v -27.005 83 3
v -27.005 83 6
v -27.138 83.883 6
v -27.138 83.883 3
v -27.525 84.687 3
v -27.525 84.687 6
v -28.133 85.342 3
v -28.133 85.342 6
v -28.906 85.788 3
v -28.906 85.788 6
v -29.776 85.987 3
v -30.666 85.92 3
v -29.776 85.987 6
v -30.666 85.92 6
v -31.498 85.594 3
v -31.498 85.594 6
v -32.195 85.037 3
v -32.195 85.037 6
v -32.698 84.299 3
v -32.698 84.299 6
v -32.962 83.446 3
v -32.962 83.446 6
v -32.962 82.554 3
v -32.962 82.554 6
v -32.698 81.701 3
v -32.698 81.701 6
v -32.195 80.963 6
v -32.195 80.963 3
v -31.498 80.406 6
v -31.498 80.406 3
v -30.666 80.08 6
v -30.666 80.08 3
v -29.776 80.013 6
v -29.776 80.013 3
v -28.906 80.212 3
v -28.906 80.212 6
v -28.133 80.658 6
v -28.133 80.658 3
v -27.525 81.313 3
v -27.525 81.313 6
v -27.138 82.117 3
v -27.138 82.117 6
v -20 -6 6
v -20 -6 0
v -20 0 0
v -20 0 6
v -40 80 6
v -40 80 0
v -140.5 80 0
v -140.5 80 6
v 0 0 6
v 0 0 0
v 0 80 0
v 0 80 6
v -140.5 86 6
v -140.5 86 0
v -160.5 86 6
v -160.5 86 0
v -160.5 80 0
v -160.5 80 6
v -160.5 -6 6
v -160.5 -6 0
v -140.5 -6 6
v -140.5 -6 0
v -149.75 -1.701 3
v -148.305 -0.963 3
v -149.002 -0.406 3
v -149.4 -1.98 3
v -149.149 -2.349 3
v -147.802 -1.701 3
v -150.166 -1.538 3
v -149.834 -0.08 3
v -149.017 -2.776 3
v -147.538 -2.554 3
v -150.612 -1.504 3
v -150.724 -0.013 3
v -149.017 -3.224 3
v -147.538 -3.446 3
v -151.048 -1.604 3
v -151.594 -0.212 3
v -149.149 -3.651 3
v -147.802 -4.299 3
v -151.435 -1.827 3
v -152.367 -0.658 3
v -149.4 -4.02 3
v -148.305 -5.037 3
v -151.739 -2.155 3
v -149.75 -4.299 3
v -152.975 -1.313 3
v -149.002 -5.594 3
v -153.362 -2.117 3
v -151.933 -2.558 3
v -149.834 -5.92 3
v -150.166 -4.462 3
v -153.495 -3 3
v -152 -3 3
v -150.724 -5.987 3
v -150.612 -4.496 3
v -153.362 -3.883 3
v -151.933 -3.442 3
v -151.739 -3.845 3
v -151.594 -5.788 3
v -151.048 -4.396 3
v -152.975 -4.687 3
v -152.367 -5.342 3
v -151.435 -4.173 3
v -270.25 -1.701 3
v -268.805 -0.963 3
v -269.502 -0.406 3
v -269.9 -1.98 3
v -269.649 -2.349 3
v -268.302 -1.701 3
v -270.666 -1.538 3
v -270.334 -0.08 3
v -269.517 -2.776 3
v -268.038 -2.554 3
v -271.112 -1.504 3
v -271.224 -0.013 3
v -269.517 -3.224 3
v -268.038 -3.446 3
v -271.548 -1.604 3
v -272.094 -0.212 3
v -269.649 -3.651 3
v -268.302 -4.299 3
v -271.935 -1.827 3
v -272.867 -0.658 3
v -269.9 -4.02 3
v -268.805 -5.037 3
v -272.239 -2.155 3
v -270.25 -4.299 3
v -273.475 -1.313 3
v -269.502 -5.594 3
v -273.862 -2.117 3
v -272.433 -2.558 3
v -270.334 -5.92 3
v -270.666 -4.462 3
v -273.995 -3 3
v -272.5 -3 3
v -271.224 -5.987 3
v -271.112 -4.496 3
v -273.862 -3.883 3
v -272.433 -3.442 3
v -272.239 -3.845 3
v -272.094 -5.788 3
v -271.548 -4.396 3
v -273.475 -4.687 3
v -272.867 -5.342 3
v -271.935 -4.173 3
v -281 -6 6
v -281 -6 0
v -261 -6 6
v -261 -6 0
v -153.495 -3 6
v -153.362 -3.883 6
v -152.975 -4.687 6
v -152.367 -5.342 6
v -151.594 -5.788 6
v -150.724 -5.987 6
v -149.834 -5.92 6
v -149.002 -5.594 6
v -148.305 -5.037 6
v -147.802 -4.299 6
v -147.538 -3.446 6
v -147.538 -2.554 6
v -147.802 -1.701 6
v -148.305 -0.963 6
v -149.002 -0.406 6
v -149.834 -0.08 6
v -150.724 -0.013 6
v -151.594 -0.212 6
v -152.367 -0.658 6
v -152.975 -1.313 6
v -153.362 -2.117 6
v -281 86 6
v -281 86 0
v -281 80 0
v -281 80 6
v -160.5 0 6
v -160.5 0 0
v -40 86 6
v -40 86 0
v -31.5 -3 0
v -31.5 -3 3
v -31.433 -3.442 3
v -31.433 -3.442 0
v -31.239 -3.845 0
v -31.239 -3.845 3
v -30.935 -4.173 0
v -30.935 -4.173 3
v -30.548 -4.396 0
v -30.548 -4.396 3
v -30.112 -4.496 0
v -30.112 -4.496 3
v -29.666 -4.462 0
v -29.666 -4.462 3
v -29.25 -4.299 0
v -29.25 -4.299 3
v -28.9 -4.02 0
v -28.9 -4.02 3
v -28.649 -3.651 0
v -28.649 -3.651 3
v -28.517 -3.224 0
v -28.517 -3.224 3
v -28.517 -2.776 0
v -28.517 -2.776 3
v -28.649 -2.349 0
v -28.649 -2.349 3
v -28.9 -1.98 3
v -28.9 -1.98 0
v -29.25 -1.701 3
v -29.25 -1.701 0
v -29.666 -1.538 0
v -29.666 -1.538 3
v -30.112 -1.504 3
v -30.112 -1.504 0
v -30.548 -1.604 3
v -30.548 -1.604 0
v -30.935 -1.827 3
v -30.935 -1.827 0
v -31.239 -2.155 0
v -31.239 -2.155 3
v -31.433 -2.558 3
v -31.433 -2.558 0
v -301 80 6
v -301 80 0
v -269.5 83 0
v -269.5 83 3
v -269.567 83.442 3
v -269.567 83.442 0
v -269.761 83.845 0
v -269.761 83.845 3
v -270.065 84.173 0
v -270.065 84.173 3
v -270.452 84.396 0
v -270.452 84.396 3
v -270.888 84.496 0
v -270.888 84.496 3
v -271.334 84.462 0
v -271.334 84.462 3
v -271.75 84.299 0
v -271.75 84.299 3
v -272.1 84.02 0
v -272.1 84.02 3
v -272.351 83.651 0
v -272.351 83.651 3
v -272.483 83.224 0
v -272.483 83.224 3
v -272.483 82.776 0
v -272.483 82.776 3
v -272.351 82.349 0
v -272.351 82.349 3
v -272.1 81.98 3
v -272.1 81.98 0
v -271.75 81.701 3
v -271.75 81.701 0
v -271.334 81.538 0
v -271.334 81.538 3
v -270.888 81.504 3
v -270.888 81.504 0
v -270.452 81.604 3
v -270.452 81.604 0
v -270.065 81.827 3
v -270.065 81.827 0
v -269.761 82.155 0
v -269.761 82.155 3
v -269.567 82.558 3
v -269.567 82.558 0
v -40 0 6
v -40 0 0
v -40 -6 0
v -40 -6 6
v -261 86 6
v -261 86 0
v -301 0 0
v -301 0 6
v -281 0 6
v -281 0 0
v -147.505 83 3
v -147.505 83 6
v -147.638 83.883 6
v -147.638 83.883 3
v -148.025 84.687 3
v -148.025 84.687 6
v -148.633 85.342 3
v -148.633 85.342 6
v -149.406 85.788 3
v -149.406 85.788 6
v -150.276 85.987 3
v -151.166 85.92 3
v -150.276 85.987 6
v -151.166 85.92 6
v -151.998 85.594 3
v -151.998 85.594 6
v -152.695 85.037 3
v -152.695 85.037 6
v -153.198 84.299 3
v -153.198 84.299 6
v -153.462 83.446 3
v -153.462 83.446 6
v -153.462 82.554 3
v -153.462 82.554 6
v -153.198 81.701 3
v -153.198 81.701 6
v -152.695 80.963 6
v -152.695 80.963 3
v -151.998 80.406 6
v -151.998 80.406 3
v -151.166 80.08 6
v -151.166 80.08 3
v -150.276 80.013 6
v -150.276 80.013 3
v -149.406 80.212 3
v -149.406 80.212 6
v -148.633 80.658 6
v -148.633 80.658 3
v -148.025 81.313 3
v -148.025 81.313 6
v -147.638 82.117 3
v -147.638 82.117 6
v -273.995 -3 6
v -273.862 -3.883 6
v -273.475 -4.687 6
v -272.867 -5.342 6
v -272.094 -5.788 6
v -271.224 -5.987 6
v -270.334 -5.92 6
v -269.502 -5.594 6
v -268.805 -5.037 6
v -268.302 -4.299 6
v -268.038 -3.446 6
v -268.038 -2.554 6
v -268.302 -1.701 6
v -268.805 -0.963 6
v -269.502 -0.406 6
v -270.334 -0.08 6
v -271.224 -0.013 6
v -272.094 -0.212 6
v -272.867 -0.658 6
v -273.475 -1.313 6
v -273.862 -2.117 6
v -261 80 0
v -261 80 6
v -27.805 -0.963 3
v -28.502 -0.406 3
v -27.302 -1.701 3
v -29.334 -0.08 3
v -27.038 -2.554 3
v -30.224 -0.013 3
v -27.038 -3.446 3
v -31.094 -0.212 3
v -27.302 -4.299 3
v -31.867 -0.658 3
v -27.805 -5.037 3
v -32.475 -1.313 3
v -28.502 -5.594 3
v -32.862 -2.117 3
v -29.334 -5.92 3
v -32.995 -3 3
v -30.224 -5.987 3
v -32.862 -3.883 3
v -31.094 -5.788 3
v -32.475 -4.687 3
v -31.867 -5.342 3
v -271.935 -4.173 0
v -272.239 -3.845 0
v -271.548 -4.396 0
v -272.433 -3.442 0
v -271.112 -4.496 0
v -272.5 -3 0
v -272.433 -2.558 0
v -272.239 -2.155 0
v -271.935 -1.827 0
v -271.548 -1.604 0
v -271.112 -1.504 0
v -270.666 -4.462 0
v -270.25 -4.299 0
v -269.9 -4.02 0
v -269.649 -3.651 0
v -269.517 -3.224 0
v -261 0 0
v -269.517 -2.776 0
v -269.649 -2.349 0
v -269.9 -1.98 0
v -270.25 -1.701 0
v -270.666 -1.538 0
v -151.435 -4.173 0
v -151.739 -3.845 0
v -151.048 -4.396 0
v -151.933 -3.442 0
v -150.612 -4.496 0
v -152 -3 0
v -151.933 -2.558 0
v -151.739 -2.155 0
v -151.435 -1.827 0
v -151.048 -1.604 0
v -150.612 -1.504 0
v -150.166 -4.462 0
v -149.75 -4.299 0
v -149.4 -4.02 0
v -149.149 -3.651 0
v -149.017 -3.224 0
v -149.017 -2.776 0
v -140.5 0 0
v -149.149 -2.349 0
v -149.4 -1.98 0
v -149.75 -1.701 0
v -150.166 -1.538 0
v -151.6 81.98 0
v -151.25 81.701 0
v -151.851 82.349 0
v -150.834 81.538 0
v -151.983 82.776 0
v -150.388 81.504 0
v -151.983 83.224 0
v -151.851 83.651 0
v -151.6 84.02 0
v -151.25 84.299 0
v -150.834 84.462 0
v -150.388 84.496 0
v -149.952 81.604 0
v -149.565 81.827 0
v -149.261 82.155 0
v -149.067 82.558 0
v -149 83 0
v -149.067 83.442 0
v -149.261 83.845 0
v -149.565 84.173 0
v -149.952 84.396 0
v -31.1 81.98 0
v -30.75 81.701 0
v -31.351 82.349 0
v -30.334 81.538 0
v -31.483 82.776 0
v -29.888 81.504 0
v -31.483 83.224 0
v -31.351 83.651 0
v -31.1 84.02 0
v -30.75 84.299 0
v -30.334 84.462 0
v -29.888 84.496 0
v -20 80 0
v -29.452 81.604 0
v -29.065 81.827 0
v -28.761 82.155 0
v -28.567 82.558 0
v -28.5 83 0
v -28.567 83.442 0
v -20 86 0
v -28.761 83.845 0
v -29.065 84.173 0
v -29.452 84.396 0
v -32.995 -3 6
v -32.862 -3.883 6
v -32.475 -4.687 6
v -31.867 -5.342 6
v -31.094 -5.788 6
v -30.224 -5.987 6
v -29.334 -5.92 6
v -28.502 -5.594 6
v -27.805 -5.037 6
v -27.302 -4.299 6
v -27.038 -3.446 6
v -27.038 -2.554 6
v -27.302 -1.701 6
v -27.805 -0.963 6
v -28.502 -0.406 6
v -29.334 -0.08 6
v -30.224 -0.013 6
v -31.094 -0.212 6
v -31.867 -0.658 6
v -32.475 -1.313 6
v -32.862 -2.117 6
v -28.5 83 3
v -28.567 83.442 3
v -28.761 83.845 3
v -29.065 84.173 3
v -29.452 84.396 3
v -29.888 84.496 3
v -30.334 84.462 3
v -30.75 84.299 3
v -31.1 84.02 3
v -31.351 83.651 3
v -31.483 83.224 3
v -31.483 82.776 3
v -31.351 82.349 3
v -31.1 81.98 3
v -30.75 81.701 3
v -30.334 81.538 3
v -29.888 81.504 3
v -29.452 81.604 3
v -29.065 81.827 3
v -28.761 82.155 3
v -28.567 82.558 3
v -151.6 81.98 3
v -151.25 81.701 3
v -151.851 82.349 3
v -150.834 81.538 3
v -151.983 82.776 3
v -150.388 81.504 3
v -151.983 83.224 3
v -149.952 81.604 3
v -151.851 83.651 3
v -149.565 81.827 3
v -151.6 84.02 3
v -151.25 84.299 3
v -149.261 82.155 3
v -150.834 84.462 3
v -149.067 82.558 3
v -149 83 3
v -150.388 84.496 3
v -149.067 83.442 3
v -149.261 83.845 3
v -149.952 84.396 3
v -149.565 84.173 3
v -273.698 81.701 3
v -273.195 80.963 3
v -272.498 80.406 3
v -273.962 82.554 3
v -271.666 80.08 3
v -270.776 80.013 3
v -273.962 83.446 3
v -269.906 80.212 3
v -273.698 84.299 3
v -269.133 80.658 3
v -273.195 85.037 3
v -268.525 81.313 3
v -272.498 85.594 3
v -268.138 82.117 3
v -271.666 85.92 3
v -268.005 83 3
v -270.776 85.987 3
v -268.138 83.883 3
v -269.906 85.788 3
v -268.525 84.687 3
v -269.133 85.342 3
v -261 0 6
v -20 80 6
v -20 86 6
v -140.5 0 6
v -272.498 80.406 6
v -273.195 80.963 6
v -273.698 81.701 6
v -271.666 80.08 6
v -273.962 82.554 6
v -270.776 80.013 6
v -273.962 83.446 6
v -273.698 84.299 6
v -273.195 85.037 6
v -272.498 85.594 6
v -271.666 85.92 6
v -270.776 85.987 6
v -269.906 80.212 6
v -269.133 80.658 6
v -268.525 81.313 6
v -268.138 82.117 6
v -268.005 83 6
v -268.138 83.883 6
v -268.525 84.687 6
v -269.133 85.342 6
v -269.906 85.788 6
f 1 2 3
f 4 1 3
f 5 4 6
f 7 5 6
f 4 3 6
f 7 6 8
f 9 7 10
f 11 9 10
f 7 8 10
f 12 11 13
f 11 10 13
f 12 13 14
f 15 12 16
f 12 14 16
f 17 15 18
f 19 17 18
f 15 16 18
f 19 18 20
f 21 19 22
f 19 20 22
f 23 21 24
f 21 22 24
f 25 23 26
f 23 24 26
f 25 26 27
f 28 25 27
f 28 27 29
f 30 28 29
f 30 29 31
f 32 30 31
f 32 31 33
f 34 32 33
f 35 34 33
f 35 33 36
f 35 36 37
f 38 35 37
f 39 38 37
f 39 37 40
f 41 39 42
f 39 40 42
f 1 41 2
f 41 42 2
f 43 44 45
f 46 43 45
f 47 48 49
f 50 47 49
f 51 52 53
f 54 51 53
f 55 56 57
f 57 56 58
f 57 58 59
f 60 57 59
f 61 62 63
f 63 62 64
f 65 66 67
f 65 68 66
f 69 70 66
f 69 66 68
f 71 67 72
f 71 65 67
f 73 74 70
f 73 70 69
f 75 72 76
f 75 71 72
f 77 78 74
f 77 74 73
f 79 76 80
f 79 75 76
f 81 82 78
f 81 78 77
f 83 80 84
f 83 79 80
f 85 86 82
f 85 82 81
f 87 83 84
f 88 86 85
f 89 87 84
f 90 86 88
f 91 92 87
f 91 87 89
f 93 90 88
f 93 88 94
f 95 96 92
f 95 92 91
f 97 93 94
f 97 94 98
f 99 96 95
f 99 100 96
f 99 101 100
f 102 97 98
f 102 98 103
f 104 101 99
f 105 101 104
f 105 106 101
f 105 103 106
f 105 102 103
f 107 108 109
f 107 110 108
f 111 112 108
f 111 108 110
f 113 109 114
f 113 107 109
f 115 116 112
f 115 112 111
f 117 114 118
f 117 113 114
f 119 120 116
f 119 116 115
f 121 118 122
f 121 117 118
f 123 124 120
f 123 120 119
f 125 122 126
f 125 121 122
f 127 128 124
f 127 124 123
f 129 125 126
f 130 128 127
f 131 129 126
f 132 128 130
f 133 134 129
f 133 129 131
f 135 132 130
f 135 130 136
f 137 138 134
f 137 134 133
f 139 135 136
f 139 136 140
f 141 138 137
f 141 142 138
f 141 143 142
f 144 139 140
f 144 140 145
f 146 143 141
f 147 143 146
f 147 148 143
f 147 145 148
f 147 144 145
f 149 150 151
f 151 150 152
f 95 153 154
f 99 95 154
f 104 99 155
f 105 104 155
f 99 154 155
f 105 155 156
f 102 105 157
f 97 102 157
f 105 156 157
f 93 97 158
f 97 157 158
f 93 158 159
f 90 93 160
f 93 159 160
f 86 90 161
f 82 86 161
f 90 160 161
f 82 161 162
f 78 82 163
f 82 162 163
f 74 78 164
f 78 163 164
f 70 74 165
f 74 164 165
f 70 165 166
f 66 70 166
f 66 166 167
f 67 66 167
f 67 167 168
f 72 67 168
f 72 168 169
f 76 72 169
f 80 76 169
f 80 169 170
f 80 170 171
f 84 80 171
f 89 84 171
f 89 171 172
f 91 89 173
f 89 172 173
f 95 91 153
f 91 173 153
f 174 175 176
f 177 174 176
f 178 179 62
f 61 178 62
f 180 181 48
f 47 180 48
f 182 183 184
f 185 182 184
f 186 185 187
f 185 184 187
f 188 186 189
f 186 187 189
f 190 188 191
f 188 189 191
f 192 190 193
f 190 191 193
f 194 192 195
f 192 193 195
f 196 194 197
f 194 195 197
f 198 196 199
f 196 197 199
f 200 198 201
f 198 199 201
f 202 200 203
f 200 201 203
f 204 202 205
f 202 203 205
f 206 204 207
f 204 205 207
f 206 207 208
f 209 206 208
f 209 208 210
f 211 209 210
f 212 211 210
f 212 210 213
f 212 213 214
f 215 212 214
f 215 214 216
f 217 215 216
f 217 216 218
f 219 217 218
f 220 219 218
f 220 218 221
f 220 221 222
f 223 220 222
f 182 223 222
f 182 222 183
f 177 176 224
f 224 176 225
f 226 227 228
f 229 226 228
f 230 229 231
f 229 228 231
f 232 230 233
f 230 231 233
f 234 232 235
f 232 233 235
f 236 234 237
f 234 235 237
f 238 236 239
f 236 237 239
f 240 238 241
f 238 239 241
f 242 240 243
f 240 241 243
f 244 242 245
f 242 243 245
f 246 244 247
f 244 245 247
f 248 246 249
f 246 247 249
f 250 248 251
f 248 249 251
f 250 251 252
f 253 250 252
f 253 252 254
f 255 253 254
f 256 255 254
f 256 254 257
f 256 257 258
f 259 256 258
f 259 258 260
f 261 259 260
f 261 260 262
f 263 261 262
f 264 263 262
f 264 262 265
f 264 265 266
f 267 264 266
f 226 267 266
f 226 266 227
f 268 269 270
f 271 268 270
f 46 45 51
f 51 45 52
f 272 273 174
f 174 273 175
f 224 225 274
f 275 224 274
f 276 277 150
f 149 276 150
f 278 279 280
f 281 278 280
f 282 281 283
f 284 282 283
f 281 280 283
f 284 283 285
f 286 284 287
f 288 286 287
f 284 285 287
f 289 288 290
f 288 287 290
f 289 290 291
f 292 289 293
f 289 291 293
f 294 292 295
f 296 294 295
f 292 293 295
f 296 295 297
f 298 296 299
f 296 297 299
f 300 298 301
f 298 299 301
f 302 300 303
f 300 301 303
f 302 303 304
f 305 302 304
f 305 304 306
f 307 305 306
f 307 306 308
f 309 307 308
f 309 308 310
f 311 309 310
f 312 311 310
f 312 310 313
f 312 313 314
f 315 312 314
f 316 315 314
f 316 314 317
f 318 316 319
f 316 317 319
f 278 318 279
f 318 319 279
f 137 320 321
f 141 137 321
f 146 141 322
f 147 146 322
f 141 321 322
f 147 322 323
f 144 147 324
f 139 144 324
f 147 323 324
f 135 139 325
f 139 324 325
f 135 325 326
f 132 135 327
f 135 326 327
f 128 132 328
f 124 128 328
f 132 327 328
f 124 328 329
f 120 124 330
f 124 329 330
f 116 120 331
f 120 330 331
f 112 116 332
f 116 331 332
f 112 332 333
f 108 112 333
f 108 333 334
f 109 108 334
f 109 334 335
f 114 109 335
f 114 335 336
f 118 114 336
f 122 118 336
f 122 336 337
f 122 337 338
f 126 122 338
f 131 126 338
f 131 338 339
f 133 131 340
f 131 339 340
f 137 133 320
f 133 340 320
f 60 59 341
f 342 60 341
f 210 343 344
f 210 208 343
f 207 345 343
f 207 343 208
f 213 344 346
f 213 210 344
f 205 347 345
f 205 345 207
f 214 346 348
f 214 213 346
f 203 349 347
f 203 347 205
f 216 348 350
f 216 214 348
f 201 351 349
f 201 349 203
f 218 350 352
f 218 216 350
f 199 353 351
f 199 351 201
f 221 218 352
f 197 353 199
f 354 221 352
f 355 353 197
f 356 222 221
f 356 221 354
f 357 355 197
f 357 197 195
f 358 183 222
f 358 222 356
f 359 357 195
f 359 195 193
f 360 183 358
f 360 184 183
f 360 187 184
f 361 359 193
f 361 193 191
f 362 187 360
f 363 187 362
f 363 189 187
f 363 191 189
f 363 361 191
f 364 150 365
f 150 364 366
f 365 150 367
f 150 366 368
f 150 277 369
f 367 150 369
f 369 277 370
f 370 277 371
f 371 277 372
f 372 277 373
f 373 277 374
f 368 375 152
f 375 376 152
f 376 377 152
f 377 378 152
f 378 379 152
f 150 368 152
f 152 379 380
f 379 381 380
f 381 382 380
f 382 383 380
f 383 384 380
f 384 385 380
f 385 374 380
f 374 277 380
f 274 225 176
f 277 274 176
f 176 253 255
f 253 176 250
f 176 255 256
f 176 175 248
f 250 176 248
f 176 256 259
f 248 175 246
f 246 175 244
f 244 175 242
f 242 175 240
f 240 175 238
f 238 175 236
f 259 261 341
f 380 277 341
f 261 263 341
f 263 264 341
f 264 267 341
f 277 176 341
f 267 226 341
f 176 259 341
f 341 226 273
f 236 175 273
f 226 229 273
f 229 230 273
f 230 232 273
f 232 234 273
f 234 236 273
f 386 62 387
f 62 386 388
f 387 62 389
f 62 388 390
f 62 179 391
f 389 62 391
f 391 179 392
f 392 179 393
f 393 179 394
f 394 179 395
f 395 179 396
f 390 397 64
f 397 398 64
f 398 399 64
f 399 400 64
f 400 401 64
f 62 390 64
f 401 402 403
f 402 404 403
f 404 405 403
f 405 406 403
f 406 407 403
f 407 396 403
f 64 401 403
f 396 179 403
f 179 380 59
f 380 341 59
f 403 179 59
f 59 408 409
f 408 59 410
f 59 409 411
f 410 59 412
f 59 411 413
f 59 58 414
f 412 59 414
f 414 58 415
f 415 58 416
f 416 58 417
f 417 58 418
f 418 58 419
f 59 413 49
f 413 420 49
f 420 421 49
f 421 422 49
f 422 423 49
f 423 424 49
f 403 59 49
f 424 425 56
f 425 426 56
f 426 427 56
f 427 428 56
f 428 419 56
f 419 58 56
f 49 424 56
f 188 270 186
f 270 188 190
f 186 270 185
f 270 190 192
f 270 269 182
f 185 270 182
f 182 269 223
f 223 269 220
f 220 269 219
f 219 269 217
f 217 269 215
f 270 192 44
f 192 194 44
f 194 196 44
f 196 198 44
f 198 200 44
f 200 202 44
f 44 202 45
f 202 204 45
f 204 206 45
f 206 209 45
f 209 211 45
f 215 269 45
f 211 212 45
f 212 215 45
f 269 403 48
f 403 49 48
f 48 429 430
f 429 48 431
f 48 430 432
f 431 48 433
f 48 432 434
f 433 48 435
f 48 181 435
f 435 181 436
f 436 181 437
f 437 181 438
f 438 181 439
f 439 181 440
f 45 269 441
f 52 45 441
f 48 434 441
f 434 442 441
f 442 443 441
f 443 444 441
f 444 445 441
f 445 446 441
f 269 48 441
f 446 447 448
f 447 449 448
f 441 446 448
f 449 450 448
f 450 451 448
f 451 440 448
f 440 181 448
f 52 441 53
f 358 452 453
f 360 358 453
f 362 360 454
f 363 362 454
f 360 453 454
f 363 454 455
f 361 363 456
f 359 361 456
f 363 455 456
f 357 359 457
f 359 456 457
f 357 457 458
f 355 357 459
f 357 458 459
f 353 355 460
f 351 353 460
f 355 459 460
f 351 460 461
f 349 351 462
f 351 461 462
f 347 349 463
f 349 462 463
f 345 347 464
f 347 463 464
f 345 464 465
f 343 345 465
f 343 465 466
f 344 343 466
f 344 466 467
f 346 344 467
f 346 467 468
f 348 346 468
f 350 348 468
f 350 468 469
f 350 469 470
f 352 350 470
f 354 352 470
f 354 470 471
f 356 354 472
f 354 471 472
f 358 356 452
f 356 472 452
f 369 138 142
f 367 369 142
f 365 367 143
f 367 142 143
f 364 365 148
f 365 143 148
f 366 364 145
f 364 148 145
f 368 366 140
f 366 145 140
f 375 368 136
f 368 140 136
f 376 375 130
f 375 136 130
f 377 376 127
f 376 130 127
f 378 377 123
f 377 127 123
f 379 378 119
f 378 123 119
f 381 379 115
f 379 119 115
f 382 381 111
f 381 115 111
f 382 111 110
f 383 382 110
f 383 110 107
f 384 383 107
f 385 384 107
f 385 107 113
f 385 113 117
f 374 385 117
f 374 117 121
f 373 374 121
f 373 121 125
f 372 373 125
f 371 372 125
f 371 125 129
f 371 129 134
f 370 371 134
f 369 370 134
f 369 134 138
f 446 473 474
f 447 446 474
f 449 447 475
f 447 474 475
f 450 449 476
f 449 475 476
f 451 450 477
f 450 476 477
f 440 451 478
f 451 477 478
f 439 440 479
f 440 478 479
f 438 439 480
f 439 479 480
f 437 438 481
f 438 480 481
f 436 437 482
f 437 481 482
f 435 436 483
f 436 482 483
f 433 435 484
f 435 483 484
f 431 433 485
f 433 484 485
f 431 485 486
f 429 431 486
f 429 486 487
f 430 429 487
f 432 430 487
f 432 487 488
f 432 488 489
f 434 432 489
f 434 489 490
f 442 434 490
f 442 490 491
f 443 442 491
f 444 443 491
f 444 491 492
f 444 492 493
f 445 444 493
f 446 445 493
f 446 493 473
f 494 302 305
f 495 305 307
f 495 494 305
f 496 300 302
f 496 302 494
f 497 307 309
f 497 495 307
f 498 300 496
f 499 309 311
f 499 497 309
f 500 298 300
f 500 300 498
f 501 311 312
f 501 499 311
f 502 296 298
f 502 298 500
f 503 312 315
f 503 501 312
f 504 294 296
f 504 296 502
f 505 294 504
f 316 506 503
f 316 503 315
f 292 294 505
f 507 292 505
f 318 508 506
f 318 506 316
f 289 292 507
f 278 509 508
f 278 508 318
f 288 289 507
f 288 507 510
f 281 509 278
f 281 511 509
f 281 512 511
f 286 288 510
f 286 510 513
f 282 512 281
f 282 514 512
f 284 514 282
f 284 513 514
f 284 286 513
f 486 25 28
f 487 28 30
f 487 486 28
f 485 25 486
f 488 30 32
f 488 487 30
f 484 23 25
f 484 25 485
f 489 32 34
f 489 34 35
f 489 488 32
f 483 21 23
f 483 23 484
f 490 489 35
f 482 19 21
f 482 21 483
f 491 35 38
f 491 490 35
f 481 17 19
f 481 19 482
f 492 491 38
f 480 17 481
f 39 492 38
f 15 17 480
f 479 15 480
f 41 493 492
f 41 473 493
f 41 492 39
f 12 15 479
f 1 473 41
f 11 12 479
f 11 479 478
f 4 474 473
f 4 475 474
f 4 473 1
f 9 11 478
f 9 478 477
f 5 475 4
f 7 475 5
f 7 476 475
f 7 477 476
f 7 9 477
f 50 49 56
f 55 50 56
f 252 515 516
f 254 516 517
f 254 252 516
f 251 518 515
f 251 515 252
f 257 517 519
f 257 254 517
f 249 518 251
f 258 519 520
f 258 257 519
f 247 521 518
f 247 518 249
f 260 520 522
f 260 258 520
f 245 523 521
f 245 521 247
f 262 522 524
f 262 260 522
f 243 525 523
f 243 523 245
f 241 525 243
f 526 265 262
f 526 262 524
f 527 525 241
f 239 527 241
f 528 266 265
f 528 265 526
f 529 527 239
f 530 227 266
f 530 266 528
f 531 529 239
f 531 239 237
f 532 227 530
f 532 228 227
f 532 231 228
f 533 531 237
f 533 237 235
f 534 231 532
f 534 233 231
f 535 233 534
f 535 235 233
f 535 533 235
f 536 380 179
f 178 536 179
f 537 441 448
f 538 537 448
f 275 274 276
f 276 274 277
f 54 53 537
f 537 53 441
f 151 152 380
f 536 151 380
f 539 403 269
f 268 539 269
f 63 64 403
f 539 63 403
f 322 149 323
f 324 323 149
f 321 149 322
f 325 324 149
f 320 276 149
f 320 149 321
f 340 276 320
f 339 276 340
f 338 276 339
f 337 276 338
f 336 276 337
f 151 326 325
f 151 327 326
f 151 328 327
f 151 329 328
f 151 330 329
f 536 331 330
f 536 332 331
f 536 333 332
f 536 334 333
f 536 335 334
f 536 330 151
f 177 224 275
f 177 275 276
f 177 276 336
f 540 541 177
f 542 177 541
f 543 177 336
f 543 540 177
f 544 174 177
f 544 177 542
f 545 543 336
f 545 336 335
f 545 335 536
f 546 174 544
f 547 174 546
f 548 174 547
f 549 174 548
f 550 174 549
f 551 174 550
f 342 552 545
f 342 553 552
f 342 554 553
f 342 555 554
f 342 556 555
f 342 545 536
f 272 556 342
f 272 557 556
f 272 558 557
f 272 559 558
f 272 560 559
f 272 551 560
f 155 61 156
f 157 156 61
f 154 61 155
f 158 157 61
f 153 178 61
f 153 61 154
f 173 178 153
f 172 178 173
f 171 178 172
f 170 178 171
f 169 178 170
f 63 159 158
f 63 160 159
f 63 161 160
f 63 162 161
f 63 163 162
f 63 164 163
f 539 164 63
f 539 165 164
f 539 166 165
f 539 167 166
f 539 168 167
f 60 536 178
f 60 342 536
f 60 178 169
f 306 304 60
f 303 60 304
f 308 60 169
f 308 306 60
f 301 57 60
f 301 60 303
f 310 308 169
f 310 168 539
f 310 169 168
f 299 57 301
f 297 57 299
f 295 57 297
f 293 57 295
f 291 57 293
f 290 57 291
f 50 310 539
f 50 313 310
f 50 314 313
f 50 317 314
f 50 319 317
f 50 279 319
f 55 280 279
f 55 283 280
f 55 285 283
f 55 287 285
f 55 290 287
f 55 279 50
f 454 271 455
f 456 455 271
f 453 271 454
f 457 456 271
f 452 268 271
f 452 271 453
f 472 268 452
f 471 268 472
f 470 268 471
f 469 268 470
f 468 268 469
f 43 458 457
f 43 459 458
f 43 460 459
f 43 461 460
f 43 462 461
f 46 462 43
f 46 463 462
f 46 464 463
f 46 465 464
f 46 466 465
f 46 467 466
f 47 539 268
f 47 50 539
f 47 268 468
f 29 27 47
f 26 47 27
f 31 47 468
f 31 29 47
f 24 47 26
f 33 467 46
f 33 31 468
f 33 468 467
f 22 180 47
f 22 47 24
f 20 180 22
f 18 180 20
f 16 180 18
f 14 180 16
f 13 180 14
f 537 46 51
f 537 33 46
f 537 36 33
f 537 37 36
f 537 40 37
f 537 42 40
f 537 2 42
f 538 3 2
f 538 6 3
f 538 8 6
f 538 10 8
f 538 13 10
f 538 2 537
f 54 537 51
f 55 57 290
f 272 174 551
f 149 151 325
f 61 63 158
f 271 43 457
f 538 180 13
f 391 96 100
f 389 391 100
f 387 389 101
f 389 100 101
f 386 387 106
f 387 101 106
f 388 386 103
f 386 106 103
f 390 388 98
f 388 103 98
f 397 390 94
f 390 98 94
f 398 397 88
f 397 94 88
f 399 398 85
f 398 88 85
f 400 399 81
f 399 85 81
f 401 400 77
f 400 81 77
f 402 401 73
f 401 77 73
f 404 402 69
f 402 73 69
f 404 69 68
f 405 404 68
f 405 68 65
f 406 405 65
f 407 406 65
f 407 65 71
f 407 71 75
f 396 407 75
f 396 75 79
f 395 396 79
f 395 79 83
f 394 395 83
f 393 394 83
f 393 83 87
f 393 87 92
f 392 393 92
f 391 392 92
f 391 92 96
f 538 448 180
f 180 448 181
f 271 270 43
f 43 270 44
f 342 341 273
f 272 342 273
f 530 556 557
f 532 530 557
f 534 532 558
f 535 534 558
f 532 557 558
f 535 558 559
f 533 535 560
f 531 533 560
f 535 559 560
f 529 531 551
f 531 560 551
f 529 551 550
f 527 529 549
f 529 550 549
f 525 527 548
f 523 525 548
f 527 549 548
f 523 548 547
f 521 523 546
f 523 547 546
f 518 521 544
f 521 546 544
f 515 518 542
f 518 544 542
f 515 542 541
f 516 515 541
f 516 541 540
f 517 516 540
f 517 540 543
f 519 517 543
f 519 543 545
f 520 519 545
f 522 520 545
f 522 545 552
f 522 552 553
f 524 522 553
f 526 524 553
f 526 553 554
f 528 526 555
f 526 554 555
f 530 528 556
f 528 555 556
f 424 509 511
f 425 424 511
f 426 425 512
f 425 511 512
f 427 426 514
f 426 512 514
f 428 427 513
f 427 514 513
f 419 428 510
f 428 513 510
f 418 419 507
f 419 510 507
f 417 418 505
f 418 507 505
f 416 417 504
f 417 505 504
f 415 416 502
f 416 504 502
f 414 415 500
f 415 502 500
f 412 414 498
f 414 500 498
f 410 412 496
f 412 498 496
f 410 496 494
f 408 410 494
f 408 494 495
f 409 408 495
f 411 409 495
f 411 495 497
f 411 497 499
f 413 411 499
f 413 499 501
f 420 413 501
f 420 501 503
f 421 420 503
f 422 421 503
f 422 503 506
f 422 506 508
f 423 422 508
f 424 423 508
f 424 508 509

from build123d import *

# Parameters (mm, degrees)
BOSS_EXTRU_1_DEPTH      = 6
ESQUISSE2_R             = 1.5
ENL_V_MAT_EXTRU_1_DEPTH = 314.10221973
ESQUISSE3_R             = 2.995
ENL_V_MAT_EXTRU_2_DEPTH = 3


with BuildPart() as part:
    # Esquisse1 → Boss.-Extru.1 (new body)
    with BuildSketch(Plane.XY):
        Polygon((-40, 80), (-140.5, 80), (-140.5, 86), (-160.5, 86), (-160.5, 80), (-261, 80), (-261, 86), (-281, 86), (-281, 80), (-301, 80), (-301, 0), (-281, 0), (-281, -6), (-261, -6), (-261, 0), (-160.5, 0), (-160.5, -6), (-140.5, -6), (-140.5, 0), (-40, 0), (-40, -6), (-20, -6), (-20, 0), (0, 0), (0, 80), (-20, 80), (-20, 86), (-40, 86), align=None)
    extrude(amount=BOSS_EXTRU_1_DEPTH)

    # Esquisse2 → Enlèv. mat.-Extru.1 (cut, through all)
    with BuildSketch(Plane.XY.offset(6)):
        with Locations((-271, 83)):
            Circle(ESQUISSE2_R)
        with Locations((-150.5, 83)):
            Circle(ESQUISSE2_R)
        with Locations((-30, 83)):
            Circle(ESQUISSE2_R)
        with Locations(Location((-271, -3, 0), (0, 0, 180))):
            Circle(ESQUISSE2_R)
        with Locations(Location((-150.5, -3, 0), (0, 0, 180))):
            Circle(ESQUISSE2_R)
        with Locations(Location((-30, -3, 0), (0, 0, 180))):
            Circle(ESQUISSE2_R)
    extrude(amount=-ENL_V_MAT_EXTRU_1_DEPTH, mode=Mode.SUBTRACT)

    # Esquisse3 → Enlèv. mat.-Extru.2 (cut)
    with BuildSketch(Plane.XY.offset(6)):
        with Locations((-271, 83)):
            Circle(ESQUISSE3_R)
        with Locations((-150.5, 83)):
            Circle(ESQUISSE3_R)
        with Locations((-30, 83)):
            Circle(ESQUISSE3_R)
        with Locations(Location((-30, -3, 0), (0, 0, 180))):
            Circle(ESQUISSE3_R)
        with Locations(Location((-150.5, -3, 0), (0, 0, 180))):
            Circle(ESQUISSE3_R)
        with Locations(Location((-271, -3, 0), (0, 0, 180))):
            Circle(ESQUISSE3_R)
    extrude(amount=-ENL_V_MAT_EXTRU_2_DEPTH, mode=Mode.SUBTRACT)


solid = part.part
